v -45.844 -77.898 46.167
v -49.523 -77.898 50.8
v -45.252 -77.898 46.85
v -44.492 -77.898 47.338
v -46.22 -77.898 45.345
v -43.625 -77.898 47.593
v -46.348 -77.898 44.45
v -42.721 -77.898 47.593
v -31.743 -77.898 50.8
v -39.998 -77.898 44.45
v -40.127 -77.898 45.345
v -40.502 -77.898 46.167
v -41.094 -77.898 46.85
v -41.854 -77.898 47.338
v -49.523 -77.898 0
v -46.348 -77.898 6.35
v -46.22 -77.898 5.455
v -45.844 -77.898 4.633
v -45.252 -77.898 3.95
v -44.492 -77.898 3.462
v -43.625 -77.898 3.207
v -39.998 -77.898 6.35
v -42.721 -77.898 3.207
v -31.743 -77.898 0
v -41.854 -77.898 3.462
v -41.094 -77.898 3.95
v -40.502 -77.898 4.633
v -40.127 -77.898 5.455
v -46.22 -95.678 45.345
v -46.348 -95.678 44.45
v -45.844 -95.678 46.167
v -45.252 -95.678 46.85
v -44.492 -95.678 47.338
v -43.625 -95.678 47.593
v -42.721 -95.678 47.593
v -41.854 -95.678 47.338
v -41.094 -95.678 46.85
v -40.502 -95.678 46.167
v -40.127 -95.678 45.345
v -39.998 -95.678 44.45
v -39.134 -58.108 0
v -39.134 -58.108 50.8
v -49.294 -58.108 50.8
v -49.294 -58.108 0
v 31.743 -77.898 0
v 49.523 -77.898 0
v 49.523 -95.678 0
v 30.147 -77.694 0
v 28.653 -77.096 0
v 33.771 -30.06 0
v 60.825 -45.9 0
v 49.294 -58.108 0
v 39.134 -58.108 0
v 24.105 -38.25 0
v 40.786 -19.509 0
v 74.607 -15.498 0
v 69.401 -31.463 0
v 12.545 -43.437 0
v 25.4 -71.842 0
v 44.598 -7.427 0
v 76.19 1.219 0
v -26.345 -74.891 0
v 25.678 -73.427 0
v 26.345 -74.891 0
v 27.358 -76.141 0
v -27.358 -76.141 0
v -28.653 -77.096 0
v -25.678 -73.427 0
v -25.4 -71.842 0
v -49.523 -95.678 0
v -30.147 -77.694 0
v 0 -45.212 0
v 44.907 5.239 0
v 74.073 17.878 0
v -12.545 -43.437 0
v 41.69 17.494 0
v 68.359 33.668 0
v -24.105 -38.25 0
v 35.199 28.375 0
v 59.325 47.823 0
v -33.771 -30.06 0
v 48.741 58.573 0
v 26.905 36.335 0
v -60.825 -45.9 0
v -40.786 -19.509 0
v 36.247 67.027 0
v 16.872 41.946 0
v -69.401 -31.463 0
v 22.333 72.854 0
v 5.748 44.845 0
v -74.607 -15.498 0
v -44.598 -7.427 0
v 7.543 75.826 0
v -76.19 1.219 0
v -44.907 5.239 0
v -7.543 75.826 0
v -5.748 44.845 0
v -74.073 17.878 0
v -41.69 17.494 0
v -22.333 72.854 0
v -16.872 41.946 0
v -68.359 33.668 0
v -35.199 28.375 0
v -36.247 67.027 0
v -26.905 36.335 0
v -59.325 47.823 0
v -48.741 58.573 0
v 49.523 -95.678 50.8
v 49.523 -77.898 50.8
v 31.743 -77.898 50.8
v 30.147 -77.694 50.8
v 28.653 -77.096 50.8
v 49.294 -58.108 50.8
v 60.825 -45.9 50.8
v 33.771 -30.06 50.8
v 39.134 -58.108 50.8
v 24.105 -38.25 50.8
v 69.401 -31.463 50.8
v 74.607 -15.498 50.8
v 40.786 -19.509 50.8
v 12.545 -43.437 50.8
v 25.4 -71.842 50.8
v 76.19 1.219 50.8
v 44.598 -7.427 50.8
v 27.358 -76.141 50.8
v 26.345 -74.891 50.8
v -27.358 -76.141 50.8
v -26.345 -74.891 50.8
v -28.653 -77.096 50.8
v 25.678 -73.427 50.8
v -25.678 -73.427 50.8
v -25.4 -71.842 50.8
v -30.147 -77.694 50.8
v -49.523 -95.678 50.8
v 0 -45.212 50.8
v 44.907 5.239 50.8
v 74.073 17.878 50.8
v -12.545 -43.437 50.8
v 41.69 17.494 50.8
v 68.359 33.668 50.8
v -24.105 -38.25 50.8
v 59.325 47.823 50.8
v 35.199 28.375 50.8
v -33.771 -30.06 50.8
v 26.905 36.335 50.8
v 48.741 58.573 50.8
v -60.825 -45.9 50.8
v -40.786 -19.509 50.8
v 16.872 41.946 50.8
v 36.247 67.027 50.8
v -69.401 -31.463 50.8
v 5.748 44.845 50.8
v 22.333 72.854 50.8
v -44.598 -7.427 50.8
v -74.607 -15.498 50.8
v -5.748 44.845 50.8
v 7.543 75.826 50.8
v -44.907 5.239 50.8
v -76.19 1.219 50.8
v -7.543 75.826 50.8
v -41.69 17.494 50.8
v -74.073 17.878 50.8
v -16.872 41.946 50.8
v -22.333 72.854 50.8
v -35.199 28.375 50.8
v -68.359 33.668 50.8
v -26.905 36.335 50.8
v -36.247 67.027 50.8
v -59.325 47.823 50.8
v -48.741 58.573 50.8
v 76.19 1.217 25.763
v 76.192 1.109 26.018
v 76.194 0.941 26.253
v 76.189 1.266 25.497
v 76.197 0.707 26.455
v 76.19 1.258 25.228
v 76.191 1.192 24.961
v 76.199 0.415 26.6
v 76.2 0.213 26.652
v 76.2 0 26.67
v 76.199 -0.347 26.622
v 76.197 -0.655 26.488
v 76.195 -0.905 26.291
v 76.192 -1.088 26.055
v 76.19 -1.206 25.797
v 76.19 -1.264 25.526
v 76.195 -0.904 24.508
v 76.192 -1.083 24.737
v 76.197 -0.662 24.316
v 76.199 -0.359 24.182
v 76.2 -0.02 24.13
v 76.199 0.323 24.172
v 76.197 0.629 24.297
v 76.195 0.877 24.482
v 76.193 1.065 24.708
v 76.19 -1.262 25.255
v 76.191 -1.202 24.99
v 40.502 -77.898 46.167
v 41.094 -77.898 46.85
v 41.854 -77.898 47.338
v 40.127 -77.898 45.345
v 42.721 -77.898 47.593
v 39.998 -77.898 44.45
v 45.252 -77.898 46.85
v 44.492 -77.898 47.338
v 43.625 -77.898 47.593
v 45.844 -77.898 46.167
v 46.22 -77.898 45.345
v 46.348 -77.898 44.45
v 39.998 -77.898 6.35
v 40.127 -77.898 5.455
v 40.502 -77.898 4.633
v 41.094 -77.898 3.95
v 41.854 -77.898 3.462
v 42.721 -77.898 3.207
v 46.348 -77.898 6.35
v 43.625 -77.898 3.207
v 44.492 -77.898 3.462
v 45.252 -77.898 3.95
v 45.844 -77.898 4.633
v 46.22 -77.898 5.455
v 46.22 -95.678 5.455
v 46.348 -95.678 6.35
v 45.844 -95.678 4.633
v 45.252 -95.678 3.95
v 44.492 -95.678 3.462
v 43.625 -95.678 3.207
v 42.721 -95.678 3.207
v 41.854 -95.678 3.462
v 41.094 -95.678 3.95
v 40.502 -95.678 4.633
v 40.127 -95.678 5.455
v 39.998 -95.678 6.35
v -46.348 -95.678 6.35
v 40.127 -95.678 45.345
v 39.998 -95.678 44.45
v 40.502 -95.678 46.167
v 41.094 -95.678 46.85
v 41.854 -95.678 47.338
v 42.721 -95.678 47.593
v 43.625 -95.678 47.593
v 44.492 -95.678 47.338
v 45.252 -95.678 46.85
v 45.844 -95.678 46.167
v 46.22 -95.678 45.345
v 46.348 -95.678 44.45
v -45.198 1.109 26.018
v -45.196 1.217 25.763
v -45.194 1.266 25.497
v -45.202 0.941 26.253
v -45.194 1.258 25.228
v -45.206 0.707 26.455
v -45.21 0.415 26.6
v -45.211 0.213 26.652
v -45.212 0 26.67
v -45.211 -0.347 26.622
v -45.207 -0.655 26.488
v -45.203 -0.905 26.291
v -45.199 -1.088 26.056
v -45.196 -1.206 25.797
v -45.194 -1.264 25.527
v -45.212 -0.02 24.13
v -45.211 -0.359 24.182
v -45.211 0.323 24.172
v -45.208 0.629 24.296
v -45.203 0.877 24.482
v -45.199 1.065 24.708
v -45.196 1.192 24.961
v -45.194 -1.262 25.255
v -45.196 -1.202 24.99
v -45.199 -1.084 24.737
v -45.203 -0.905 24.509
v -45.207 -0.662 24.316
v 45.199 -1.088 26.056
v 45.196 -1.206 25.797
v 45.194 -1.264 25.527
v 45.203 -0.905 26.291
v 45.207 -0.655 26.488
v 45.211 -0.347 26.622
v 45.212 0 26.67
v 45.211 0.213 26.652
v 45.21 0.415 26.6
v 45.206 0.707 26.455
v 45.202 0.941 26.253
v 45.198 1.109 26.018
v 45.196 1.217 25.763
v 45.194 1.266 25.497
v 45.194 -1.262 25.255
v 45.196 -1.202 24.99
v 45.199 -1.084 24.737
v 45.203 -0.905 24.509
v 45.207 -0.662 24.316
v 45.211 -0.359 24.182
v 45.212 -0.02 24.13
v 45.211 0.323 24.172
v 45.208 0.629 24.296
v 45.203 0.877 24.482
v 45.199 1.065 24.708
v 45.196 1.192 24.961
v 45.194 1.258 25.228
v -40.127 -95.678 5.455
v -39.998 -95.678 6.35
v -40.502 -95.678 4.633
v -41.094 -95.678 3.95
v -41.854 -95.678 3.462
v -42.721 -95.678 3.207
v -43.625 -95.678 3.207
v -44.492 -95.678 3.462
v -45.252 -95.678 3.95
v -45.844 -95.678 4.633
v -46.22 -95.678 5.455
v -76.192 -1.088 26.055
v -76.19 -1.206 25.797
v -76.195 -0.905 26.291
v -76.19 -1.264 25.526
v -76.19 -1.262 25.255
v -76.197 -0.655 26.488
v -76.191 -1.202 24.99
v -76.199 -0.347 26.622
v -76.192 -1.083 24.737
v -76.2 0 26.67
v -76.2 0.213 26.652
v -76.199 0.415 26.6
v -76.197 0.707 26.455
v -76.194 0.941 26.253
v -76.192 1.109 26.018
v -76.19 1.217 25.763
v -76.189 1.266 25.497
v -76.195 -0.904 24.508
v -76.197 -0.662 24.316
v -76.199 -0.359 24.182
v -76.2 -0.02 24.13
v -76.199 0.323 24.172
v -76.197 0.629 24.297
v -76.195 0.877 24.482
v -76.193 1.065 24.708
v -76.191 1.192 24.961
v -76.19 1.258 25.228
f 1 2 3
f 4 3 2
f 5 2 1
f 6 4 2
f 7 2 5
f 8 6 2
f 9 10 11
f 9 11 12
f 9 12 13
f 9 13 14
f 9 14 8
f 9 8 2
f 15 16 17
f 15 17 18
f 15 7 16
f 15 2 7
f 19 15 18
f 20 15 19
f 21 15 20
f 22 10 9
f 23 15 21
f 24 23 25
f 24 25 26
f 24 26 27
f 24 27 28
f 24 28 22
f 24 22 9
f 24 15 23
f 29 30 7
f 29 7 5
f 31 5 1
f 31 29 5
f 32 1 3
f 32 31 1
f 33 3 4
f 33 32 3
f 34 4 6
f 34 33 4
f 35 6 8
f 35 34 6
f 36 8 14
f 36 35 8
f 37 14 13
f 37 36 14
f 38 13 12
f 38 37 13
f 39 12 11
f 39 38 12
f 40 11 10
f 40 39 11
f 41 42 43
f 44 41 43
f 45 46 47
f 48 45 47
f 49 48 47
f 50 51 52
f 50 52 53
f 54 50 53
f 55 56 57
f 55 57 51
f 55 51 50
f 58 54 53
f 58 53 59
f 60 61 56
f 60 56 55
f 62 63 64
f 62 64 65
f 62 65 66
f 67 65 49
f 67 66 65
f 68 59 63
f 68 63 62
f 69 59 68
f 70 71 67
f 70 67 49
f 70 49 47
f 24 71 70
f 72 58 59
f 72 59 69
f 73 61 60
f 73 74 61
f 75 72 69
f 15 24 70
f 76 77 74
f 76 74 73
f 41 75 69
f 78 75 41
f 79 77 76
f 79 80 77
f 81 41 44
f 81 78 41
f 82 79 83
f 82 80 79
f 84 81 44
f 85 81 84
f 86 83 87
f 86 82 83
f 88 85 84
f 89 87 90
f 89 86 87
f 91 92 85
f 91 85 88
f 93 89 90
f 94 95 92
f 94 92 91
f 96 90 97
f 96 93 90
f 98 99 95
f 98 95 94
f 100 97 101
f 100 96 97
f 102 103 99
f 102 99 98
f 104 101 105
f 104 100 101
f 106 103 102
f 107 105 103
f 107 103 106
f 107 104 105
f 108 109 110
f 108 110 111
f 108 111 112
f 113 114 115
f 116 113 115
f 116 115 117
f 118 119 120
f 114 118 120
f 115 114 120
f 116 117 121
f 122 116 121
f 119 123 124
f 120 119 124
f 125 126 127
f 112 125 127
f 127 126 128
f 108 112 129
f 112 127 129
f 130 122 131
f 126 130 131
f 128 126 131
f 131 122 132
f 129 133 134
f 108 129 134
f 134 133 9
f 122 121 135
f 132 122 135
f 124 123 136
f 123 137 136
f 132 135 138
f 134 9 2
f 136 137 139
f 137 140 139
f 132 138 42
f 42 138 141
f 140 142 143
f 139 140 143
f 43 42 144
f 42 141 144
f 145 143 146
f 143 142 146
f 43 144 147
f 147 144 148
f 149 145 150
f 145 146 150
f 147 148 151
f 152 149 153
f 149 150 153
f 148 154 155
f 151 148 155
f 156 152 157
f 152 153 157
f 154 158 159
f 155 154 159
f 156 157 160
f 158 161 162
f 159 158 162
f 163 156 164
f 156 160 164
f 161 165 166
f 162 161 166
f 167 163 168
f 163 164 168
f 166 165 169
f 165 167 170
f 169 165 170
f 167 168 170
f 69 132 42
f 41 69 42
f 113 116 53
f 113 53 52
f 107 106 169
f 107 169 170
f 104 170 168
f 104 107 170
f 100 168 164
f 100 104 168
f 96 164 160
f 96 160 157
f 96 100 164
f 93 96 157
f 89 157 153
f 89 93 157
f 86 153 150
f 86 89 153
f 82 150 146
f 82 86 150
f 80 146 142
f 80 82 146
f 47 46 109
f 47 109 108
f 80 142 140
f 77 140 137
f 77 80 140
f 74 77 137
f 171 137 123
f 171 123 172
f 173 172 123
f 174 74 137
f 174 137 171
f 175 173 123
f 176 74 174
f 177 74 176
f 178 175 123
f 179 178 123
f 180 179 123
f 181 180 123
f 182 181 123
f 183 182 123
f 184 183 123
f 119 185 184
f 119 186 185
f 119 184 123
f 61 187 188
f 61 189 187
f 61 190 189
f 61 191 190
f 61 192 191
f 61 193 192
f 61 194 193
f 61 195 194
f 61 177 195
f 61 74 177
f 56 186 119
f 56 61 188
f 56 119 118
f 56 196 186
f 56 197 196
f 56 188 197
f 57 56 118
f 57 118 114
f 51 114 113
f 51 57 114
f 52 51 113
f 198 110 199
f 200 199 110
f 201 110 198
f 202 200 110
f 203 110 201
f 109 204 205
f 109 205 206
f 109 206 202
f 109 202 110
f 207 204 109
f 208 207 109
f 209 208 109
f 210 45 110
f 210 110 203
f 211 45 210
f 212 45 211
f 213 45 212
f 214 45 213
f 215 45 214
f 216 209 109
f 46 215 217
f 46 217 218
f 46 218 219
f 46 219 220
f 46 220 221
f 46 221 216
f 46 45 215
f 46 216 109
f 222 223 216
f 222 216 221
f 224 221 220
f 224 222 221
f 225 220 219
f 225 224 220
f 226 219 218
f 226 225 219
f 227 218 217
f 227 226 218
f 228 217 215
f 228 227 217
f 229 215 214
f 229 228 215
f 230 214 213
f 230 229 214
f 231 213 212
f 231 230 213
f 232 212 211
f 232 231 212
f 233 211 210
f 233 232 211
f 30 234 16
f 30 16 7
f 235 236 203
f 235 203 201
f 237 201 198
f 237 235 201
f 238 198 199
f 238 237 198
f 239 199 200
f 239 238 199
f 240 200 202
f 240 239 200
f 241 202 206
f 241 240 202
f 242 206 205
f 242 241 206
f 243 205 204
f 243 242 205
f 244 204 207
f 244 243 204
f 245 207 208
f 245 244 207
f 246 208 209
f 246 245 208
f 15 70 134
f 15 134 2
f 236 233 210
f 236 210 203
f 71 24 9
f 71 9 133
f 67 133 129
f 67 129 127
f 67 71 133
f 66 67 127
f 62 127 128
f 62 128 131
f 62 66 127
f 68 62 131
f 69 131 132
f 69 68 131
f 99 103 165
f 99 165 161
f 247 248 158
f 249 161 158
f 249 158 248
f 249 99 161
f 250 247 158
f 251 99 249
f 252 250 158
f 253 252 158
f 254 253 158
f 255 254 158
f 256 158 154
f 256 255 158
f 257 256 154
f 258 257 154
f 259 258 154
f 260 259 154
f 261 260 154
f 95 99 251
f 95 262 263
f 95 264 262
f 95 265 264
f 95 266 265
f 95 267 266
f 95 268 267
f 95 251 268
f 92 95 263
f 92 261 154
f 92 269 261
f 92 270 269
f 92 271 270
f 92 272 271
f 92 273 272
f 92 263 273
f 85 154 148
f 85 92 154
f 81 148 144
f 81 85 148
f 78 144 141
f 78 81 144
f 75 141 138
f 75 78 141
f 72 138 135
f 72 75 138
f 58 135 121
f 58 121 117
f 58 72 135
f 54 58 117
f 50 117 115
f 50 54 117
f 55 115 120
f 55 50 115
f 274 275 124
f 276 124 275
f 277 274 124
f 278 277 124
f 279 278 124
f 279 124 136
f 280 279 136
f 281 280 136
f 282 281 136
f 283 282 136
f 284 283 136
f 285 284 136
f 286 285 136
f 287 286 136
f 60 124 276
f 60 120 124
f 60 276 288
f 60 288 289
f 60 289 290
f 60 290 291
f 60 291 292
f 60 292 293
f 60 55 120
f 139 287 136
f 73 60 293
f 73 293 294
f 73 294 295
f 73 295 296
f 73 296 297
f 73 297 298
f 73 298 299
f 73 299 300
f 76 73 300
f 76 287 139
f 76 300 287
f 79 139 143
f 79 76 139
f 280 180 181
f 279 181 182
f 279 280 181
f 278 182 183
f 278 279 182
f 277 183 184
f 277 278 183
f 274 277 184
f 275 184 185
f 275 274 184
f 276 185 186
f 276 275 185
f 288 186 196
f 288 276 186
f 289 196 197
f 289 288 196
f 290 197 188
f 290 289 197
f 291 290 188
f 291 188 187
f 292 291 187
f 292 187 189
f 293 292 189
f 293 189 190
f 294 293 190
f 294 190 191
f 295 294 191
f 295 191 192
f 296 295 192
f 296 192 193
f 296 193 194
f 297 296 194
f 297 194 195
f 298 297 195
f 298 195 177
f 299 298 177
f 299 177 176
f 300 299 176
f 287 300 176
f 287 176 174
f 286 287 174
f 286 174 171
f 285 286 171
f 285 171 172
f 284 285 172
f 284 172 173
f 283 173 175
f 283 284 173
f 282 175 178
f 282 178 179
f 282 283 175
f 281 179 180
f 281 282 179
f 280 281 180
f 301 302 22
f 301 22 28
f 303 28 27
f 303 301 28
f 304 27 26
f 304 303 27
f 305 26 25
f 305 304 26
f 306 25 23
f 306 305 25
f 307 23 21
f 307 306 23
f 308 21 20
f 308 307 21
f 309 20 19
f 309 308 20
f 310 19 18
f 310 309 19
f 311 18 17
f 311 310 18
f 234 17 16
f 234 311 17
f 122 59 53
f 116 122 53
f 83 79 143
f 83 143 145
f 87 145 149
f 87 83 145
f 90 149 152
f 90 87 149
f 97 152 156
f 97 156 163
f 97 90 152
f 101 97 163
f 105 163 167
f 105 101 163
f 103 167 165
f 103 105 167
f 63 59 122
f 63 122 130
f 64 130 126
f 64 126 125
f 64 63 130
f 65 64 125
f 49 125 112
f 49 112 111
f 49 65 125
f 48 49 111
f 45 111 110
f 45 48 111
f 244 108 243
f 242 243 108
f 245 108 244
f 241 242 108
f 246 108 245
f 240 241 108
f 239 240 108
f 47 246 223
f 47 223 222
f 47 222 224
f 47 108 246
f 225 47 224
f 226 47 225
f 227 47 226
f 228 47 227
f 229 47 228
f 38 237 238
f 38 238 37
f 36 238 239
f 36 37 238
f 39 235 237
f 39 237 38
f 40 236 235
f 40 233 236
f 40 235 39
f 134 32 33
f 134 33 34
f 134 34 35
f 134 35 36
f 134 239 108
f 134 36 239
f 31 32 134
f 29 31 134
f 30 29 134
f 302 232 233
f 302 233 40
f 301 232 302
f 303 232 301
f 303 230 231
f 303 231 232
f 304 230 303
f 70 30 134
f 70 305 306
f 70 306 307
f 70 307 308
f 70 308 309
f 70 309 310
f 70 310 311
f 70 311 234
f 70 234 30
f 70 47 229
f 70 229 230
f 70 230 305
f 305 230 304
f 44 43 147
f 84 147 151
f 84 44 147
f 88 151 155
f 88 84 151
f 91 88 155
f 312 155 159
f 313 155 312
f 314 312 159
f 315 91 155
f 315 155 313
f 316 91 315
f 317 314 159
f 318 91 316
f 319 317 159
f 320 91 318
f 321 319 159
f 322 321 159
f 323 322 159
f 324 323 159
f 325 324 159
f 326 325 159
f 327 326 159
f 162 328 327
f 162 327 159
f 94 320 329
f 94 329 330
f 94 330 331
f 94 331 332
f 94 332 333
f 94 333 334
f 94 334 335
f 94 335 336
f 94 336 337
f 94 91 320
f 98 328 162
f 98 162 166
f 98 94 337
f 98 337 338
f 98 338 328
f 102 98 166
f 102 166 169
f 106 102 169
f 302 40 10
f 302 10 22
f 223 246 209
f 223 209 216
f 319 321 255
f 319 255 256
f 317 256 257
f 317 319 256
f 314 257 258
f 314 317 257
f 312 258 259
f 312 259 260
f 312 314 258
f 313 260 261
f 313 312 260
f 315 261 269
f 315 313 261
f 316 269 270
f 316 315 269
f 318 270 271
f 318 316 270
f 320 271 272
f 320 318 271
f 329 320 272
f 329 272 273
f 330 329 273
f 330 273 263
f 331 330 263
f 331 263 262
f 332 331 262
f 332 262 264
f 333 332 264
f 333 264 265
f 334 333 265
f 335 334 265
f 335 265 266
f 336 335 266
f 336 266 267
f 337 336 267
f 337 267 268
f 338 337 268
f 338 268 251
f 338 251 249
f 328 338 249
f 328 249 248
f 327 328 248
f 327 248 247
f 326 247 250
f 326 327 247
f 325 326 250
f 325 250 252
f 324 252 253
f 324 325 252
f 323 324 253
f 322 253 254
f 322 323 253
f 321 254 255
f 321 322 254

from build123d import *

# Parameters (mm, degrees)
BOSS_EXTRUDE1_DEPTH     = 50.8
CUT_EXTRUDE1_DEPTH      = 25.4
CUT_EXTRUDE2_DEPTH      = 72.136
CUT_EXTRUDE3_DEPTH      = 113.284
CUT_EXTRUDE3_DEPTH_BACK = 90.424
SKETCH5_R               = 1.27


with BuildPart() as part:
    # Sketch2 → Boss-Extrude1 (new body)
    with BuildSketch(Plane.XY):
        with BuildLine():
            Line((31.743188487, -77.898004197), (49.523188487, -77.898004197))
            Line((49.523188487, -77.898004197), (49.523188487, -95.678004197))
            Line((49.523188487, -95.678004197), (-49.523188487, -95.678004197))
            Line((-49.523188487, -95.678004197), (-49.523188487, -77.898004197))
            Line((-49.523188487, -77.898004197), (-31.743188487, -77.898004197))
            ThreePointArc((-31.743188487, -77.898004197), (-27.358253154, -76.140916358), (-25.4, -71.842048969))
            ThreePointArc((-25.4, -71.842048969), (-73.310915254, -20.783399738), (-59.324614565, 47.822903578))
            ThreePointArc((-59.324614565, 47.822903578), (0, 76.2), (59.324614565, 47.822903578))
            ThreePointArc((59.324614565, 47.822903578), (73.310915254, -20.783399738), (25.4, -71.842048969))
            ThreePointArc((25.4, -71.842048969), (27.358253154, -76.140916358), (31.743188487, -77.898004197))
        make_face()
        with BuildLine():
            ThreePointArc((-35.199271309, 28.37492279), (0, -45.212), (35.199271309, 28.37492279))
            ThreePointArc((35.199271309, 28.37492279), (0, 45.212), (-35.199271309, 28.37492279))
        make_face(mode=Mode.SUBTRACT)
    extrude(amount=BOSS_EXTRUDE1_DEPTH)

    # Sketch3 → Cut-Extrude1 (cut)
    with BuildSketch(Plane.XZ.offset(95.678004197)):
        with BuildLine():
            Line((-39.998188487, 44.45), (-39.998188487, 6.35))
            ThreePointArc((-39.998188487, 6.35), (-43.173188487, 3.175), (-46.348188487, 6.35))
            Line((-46.348188487, 6.35), (-46.348188487, 44.45))
            ThreePointArc((-46.348188487, 44.45), (-43.173188487, 47.625), (-39.998188487, 44.45))
        make_face()
        with BuildLine():
            Line((46.348188487, 44.45), (46.348188487, 6.35))
            ThreePointArc((46.348188487, 6.35), (43.173188487, 3.175), (39.998188487, 6.35))
            Line((39.998188487, 6.35), (39.998188487, 44.45))
            ThreePointArc((39.998188487, 44.45), (43.173188487, 47.625), (46.348188487, 44.45))
        make_face()
    extrude(amount=-CUT_EXTRUDE1_DEPTH, mode=Mode.SUBTRACT)

    # Sketch4 → Cut-Extrude2 (cut)
    with BuildSketch(Plane.XY.offset(50.8)):
        with BuildLine():
            Line((25.4, -71.842048969), (39.134215056, -58.107833913))
            Line((39.134215056, -58.107833913), (49.294215056, -58.107833913))
            ThreePointArc((49.294215056, -58.107833913), (40.1915566, -69.92359541), (25.4, -71.842048969))
        make_face()
        with BuildLine():
            Line((-25.400000099, -71.842048964), (-39.134215677, -58.107833386))
            Line((-39.134215677, -58.107833386), (-49.294215677, -58.107833386))
            ThreePointArc((-49.294215677, -58.107833386), (-40.191557069, -69.923595252), (-25.400000099, -71.842048964))
        make_face()
    extrude(amount=-CUT_EXTRUDE2_DEPTH, mode=Mode.SUBTRACT)

    # Sketch5 → Cut-Extrude3 (cut, two sides: drawn at the far end of the back side and taken through both)
    with BuildSketch(Plane(origin=(0, 0, 0), x_dir=(0, 0, -1), z_dir=(1, 0, 0)).offset(-CUT_EXTRUDE3_DEPTH_BACK)):
        with Locations(Location((-25.4, 0, 0), (0, 0, 180))):
            Circle(SKETCH5_R)
    extrude(amount=CUT_EXTRUDE3_DEPTH + CUT_EXTRUDE3_DEPTH_BACK, mode=Mode.SUBTRACT)


solid = part.part
